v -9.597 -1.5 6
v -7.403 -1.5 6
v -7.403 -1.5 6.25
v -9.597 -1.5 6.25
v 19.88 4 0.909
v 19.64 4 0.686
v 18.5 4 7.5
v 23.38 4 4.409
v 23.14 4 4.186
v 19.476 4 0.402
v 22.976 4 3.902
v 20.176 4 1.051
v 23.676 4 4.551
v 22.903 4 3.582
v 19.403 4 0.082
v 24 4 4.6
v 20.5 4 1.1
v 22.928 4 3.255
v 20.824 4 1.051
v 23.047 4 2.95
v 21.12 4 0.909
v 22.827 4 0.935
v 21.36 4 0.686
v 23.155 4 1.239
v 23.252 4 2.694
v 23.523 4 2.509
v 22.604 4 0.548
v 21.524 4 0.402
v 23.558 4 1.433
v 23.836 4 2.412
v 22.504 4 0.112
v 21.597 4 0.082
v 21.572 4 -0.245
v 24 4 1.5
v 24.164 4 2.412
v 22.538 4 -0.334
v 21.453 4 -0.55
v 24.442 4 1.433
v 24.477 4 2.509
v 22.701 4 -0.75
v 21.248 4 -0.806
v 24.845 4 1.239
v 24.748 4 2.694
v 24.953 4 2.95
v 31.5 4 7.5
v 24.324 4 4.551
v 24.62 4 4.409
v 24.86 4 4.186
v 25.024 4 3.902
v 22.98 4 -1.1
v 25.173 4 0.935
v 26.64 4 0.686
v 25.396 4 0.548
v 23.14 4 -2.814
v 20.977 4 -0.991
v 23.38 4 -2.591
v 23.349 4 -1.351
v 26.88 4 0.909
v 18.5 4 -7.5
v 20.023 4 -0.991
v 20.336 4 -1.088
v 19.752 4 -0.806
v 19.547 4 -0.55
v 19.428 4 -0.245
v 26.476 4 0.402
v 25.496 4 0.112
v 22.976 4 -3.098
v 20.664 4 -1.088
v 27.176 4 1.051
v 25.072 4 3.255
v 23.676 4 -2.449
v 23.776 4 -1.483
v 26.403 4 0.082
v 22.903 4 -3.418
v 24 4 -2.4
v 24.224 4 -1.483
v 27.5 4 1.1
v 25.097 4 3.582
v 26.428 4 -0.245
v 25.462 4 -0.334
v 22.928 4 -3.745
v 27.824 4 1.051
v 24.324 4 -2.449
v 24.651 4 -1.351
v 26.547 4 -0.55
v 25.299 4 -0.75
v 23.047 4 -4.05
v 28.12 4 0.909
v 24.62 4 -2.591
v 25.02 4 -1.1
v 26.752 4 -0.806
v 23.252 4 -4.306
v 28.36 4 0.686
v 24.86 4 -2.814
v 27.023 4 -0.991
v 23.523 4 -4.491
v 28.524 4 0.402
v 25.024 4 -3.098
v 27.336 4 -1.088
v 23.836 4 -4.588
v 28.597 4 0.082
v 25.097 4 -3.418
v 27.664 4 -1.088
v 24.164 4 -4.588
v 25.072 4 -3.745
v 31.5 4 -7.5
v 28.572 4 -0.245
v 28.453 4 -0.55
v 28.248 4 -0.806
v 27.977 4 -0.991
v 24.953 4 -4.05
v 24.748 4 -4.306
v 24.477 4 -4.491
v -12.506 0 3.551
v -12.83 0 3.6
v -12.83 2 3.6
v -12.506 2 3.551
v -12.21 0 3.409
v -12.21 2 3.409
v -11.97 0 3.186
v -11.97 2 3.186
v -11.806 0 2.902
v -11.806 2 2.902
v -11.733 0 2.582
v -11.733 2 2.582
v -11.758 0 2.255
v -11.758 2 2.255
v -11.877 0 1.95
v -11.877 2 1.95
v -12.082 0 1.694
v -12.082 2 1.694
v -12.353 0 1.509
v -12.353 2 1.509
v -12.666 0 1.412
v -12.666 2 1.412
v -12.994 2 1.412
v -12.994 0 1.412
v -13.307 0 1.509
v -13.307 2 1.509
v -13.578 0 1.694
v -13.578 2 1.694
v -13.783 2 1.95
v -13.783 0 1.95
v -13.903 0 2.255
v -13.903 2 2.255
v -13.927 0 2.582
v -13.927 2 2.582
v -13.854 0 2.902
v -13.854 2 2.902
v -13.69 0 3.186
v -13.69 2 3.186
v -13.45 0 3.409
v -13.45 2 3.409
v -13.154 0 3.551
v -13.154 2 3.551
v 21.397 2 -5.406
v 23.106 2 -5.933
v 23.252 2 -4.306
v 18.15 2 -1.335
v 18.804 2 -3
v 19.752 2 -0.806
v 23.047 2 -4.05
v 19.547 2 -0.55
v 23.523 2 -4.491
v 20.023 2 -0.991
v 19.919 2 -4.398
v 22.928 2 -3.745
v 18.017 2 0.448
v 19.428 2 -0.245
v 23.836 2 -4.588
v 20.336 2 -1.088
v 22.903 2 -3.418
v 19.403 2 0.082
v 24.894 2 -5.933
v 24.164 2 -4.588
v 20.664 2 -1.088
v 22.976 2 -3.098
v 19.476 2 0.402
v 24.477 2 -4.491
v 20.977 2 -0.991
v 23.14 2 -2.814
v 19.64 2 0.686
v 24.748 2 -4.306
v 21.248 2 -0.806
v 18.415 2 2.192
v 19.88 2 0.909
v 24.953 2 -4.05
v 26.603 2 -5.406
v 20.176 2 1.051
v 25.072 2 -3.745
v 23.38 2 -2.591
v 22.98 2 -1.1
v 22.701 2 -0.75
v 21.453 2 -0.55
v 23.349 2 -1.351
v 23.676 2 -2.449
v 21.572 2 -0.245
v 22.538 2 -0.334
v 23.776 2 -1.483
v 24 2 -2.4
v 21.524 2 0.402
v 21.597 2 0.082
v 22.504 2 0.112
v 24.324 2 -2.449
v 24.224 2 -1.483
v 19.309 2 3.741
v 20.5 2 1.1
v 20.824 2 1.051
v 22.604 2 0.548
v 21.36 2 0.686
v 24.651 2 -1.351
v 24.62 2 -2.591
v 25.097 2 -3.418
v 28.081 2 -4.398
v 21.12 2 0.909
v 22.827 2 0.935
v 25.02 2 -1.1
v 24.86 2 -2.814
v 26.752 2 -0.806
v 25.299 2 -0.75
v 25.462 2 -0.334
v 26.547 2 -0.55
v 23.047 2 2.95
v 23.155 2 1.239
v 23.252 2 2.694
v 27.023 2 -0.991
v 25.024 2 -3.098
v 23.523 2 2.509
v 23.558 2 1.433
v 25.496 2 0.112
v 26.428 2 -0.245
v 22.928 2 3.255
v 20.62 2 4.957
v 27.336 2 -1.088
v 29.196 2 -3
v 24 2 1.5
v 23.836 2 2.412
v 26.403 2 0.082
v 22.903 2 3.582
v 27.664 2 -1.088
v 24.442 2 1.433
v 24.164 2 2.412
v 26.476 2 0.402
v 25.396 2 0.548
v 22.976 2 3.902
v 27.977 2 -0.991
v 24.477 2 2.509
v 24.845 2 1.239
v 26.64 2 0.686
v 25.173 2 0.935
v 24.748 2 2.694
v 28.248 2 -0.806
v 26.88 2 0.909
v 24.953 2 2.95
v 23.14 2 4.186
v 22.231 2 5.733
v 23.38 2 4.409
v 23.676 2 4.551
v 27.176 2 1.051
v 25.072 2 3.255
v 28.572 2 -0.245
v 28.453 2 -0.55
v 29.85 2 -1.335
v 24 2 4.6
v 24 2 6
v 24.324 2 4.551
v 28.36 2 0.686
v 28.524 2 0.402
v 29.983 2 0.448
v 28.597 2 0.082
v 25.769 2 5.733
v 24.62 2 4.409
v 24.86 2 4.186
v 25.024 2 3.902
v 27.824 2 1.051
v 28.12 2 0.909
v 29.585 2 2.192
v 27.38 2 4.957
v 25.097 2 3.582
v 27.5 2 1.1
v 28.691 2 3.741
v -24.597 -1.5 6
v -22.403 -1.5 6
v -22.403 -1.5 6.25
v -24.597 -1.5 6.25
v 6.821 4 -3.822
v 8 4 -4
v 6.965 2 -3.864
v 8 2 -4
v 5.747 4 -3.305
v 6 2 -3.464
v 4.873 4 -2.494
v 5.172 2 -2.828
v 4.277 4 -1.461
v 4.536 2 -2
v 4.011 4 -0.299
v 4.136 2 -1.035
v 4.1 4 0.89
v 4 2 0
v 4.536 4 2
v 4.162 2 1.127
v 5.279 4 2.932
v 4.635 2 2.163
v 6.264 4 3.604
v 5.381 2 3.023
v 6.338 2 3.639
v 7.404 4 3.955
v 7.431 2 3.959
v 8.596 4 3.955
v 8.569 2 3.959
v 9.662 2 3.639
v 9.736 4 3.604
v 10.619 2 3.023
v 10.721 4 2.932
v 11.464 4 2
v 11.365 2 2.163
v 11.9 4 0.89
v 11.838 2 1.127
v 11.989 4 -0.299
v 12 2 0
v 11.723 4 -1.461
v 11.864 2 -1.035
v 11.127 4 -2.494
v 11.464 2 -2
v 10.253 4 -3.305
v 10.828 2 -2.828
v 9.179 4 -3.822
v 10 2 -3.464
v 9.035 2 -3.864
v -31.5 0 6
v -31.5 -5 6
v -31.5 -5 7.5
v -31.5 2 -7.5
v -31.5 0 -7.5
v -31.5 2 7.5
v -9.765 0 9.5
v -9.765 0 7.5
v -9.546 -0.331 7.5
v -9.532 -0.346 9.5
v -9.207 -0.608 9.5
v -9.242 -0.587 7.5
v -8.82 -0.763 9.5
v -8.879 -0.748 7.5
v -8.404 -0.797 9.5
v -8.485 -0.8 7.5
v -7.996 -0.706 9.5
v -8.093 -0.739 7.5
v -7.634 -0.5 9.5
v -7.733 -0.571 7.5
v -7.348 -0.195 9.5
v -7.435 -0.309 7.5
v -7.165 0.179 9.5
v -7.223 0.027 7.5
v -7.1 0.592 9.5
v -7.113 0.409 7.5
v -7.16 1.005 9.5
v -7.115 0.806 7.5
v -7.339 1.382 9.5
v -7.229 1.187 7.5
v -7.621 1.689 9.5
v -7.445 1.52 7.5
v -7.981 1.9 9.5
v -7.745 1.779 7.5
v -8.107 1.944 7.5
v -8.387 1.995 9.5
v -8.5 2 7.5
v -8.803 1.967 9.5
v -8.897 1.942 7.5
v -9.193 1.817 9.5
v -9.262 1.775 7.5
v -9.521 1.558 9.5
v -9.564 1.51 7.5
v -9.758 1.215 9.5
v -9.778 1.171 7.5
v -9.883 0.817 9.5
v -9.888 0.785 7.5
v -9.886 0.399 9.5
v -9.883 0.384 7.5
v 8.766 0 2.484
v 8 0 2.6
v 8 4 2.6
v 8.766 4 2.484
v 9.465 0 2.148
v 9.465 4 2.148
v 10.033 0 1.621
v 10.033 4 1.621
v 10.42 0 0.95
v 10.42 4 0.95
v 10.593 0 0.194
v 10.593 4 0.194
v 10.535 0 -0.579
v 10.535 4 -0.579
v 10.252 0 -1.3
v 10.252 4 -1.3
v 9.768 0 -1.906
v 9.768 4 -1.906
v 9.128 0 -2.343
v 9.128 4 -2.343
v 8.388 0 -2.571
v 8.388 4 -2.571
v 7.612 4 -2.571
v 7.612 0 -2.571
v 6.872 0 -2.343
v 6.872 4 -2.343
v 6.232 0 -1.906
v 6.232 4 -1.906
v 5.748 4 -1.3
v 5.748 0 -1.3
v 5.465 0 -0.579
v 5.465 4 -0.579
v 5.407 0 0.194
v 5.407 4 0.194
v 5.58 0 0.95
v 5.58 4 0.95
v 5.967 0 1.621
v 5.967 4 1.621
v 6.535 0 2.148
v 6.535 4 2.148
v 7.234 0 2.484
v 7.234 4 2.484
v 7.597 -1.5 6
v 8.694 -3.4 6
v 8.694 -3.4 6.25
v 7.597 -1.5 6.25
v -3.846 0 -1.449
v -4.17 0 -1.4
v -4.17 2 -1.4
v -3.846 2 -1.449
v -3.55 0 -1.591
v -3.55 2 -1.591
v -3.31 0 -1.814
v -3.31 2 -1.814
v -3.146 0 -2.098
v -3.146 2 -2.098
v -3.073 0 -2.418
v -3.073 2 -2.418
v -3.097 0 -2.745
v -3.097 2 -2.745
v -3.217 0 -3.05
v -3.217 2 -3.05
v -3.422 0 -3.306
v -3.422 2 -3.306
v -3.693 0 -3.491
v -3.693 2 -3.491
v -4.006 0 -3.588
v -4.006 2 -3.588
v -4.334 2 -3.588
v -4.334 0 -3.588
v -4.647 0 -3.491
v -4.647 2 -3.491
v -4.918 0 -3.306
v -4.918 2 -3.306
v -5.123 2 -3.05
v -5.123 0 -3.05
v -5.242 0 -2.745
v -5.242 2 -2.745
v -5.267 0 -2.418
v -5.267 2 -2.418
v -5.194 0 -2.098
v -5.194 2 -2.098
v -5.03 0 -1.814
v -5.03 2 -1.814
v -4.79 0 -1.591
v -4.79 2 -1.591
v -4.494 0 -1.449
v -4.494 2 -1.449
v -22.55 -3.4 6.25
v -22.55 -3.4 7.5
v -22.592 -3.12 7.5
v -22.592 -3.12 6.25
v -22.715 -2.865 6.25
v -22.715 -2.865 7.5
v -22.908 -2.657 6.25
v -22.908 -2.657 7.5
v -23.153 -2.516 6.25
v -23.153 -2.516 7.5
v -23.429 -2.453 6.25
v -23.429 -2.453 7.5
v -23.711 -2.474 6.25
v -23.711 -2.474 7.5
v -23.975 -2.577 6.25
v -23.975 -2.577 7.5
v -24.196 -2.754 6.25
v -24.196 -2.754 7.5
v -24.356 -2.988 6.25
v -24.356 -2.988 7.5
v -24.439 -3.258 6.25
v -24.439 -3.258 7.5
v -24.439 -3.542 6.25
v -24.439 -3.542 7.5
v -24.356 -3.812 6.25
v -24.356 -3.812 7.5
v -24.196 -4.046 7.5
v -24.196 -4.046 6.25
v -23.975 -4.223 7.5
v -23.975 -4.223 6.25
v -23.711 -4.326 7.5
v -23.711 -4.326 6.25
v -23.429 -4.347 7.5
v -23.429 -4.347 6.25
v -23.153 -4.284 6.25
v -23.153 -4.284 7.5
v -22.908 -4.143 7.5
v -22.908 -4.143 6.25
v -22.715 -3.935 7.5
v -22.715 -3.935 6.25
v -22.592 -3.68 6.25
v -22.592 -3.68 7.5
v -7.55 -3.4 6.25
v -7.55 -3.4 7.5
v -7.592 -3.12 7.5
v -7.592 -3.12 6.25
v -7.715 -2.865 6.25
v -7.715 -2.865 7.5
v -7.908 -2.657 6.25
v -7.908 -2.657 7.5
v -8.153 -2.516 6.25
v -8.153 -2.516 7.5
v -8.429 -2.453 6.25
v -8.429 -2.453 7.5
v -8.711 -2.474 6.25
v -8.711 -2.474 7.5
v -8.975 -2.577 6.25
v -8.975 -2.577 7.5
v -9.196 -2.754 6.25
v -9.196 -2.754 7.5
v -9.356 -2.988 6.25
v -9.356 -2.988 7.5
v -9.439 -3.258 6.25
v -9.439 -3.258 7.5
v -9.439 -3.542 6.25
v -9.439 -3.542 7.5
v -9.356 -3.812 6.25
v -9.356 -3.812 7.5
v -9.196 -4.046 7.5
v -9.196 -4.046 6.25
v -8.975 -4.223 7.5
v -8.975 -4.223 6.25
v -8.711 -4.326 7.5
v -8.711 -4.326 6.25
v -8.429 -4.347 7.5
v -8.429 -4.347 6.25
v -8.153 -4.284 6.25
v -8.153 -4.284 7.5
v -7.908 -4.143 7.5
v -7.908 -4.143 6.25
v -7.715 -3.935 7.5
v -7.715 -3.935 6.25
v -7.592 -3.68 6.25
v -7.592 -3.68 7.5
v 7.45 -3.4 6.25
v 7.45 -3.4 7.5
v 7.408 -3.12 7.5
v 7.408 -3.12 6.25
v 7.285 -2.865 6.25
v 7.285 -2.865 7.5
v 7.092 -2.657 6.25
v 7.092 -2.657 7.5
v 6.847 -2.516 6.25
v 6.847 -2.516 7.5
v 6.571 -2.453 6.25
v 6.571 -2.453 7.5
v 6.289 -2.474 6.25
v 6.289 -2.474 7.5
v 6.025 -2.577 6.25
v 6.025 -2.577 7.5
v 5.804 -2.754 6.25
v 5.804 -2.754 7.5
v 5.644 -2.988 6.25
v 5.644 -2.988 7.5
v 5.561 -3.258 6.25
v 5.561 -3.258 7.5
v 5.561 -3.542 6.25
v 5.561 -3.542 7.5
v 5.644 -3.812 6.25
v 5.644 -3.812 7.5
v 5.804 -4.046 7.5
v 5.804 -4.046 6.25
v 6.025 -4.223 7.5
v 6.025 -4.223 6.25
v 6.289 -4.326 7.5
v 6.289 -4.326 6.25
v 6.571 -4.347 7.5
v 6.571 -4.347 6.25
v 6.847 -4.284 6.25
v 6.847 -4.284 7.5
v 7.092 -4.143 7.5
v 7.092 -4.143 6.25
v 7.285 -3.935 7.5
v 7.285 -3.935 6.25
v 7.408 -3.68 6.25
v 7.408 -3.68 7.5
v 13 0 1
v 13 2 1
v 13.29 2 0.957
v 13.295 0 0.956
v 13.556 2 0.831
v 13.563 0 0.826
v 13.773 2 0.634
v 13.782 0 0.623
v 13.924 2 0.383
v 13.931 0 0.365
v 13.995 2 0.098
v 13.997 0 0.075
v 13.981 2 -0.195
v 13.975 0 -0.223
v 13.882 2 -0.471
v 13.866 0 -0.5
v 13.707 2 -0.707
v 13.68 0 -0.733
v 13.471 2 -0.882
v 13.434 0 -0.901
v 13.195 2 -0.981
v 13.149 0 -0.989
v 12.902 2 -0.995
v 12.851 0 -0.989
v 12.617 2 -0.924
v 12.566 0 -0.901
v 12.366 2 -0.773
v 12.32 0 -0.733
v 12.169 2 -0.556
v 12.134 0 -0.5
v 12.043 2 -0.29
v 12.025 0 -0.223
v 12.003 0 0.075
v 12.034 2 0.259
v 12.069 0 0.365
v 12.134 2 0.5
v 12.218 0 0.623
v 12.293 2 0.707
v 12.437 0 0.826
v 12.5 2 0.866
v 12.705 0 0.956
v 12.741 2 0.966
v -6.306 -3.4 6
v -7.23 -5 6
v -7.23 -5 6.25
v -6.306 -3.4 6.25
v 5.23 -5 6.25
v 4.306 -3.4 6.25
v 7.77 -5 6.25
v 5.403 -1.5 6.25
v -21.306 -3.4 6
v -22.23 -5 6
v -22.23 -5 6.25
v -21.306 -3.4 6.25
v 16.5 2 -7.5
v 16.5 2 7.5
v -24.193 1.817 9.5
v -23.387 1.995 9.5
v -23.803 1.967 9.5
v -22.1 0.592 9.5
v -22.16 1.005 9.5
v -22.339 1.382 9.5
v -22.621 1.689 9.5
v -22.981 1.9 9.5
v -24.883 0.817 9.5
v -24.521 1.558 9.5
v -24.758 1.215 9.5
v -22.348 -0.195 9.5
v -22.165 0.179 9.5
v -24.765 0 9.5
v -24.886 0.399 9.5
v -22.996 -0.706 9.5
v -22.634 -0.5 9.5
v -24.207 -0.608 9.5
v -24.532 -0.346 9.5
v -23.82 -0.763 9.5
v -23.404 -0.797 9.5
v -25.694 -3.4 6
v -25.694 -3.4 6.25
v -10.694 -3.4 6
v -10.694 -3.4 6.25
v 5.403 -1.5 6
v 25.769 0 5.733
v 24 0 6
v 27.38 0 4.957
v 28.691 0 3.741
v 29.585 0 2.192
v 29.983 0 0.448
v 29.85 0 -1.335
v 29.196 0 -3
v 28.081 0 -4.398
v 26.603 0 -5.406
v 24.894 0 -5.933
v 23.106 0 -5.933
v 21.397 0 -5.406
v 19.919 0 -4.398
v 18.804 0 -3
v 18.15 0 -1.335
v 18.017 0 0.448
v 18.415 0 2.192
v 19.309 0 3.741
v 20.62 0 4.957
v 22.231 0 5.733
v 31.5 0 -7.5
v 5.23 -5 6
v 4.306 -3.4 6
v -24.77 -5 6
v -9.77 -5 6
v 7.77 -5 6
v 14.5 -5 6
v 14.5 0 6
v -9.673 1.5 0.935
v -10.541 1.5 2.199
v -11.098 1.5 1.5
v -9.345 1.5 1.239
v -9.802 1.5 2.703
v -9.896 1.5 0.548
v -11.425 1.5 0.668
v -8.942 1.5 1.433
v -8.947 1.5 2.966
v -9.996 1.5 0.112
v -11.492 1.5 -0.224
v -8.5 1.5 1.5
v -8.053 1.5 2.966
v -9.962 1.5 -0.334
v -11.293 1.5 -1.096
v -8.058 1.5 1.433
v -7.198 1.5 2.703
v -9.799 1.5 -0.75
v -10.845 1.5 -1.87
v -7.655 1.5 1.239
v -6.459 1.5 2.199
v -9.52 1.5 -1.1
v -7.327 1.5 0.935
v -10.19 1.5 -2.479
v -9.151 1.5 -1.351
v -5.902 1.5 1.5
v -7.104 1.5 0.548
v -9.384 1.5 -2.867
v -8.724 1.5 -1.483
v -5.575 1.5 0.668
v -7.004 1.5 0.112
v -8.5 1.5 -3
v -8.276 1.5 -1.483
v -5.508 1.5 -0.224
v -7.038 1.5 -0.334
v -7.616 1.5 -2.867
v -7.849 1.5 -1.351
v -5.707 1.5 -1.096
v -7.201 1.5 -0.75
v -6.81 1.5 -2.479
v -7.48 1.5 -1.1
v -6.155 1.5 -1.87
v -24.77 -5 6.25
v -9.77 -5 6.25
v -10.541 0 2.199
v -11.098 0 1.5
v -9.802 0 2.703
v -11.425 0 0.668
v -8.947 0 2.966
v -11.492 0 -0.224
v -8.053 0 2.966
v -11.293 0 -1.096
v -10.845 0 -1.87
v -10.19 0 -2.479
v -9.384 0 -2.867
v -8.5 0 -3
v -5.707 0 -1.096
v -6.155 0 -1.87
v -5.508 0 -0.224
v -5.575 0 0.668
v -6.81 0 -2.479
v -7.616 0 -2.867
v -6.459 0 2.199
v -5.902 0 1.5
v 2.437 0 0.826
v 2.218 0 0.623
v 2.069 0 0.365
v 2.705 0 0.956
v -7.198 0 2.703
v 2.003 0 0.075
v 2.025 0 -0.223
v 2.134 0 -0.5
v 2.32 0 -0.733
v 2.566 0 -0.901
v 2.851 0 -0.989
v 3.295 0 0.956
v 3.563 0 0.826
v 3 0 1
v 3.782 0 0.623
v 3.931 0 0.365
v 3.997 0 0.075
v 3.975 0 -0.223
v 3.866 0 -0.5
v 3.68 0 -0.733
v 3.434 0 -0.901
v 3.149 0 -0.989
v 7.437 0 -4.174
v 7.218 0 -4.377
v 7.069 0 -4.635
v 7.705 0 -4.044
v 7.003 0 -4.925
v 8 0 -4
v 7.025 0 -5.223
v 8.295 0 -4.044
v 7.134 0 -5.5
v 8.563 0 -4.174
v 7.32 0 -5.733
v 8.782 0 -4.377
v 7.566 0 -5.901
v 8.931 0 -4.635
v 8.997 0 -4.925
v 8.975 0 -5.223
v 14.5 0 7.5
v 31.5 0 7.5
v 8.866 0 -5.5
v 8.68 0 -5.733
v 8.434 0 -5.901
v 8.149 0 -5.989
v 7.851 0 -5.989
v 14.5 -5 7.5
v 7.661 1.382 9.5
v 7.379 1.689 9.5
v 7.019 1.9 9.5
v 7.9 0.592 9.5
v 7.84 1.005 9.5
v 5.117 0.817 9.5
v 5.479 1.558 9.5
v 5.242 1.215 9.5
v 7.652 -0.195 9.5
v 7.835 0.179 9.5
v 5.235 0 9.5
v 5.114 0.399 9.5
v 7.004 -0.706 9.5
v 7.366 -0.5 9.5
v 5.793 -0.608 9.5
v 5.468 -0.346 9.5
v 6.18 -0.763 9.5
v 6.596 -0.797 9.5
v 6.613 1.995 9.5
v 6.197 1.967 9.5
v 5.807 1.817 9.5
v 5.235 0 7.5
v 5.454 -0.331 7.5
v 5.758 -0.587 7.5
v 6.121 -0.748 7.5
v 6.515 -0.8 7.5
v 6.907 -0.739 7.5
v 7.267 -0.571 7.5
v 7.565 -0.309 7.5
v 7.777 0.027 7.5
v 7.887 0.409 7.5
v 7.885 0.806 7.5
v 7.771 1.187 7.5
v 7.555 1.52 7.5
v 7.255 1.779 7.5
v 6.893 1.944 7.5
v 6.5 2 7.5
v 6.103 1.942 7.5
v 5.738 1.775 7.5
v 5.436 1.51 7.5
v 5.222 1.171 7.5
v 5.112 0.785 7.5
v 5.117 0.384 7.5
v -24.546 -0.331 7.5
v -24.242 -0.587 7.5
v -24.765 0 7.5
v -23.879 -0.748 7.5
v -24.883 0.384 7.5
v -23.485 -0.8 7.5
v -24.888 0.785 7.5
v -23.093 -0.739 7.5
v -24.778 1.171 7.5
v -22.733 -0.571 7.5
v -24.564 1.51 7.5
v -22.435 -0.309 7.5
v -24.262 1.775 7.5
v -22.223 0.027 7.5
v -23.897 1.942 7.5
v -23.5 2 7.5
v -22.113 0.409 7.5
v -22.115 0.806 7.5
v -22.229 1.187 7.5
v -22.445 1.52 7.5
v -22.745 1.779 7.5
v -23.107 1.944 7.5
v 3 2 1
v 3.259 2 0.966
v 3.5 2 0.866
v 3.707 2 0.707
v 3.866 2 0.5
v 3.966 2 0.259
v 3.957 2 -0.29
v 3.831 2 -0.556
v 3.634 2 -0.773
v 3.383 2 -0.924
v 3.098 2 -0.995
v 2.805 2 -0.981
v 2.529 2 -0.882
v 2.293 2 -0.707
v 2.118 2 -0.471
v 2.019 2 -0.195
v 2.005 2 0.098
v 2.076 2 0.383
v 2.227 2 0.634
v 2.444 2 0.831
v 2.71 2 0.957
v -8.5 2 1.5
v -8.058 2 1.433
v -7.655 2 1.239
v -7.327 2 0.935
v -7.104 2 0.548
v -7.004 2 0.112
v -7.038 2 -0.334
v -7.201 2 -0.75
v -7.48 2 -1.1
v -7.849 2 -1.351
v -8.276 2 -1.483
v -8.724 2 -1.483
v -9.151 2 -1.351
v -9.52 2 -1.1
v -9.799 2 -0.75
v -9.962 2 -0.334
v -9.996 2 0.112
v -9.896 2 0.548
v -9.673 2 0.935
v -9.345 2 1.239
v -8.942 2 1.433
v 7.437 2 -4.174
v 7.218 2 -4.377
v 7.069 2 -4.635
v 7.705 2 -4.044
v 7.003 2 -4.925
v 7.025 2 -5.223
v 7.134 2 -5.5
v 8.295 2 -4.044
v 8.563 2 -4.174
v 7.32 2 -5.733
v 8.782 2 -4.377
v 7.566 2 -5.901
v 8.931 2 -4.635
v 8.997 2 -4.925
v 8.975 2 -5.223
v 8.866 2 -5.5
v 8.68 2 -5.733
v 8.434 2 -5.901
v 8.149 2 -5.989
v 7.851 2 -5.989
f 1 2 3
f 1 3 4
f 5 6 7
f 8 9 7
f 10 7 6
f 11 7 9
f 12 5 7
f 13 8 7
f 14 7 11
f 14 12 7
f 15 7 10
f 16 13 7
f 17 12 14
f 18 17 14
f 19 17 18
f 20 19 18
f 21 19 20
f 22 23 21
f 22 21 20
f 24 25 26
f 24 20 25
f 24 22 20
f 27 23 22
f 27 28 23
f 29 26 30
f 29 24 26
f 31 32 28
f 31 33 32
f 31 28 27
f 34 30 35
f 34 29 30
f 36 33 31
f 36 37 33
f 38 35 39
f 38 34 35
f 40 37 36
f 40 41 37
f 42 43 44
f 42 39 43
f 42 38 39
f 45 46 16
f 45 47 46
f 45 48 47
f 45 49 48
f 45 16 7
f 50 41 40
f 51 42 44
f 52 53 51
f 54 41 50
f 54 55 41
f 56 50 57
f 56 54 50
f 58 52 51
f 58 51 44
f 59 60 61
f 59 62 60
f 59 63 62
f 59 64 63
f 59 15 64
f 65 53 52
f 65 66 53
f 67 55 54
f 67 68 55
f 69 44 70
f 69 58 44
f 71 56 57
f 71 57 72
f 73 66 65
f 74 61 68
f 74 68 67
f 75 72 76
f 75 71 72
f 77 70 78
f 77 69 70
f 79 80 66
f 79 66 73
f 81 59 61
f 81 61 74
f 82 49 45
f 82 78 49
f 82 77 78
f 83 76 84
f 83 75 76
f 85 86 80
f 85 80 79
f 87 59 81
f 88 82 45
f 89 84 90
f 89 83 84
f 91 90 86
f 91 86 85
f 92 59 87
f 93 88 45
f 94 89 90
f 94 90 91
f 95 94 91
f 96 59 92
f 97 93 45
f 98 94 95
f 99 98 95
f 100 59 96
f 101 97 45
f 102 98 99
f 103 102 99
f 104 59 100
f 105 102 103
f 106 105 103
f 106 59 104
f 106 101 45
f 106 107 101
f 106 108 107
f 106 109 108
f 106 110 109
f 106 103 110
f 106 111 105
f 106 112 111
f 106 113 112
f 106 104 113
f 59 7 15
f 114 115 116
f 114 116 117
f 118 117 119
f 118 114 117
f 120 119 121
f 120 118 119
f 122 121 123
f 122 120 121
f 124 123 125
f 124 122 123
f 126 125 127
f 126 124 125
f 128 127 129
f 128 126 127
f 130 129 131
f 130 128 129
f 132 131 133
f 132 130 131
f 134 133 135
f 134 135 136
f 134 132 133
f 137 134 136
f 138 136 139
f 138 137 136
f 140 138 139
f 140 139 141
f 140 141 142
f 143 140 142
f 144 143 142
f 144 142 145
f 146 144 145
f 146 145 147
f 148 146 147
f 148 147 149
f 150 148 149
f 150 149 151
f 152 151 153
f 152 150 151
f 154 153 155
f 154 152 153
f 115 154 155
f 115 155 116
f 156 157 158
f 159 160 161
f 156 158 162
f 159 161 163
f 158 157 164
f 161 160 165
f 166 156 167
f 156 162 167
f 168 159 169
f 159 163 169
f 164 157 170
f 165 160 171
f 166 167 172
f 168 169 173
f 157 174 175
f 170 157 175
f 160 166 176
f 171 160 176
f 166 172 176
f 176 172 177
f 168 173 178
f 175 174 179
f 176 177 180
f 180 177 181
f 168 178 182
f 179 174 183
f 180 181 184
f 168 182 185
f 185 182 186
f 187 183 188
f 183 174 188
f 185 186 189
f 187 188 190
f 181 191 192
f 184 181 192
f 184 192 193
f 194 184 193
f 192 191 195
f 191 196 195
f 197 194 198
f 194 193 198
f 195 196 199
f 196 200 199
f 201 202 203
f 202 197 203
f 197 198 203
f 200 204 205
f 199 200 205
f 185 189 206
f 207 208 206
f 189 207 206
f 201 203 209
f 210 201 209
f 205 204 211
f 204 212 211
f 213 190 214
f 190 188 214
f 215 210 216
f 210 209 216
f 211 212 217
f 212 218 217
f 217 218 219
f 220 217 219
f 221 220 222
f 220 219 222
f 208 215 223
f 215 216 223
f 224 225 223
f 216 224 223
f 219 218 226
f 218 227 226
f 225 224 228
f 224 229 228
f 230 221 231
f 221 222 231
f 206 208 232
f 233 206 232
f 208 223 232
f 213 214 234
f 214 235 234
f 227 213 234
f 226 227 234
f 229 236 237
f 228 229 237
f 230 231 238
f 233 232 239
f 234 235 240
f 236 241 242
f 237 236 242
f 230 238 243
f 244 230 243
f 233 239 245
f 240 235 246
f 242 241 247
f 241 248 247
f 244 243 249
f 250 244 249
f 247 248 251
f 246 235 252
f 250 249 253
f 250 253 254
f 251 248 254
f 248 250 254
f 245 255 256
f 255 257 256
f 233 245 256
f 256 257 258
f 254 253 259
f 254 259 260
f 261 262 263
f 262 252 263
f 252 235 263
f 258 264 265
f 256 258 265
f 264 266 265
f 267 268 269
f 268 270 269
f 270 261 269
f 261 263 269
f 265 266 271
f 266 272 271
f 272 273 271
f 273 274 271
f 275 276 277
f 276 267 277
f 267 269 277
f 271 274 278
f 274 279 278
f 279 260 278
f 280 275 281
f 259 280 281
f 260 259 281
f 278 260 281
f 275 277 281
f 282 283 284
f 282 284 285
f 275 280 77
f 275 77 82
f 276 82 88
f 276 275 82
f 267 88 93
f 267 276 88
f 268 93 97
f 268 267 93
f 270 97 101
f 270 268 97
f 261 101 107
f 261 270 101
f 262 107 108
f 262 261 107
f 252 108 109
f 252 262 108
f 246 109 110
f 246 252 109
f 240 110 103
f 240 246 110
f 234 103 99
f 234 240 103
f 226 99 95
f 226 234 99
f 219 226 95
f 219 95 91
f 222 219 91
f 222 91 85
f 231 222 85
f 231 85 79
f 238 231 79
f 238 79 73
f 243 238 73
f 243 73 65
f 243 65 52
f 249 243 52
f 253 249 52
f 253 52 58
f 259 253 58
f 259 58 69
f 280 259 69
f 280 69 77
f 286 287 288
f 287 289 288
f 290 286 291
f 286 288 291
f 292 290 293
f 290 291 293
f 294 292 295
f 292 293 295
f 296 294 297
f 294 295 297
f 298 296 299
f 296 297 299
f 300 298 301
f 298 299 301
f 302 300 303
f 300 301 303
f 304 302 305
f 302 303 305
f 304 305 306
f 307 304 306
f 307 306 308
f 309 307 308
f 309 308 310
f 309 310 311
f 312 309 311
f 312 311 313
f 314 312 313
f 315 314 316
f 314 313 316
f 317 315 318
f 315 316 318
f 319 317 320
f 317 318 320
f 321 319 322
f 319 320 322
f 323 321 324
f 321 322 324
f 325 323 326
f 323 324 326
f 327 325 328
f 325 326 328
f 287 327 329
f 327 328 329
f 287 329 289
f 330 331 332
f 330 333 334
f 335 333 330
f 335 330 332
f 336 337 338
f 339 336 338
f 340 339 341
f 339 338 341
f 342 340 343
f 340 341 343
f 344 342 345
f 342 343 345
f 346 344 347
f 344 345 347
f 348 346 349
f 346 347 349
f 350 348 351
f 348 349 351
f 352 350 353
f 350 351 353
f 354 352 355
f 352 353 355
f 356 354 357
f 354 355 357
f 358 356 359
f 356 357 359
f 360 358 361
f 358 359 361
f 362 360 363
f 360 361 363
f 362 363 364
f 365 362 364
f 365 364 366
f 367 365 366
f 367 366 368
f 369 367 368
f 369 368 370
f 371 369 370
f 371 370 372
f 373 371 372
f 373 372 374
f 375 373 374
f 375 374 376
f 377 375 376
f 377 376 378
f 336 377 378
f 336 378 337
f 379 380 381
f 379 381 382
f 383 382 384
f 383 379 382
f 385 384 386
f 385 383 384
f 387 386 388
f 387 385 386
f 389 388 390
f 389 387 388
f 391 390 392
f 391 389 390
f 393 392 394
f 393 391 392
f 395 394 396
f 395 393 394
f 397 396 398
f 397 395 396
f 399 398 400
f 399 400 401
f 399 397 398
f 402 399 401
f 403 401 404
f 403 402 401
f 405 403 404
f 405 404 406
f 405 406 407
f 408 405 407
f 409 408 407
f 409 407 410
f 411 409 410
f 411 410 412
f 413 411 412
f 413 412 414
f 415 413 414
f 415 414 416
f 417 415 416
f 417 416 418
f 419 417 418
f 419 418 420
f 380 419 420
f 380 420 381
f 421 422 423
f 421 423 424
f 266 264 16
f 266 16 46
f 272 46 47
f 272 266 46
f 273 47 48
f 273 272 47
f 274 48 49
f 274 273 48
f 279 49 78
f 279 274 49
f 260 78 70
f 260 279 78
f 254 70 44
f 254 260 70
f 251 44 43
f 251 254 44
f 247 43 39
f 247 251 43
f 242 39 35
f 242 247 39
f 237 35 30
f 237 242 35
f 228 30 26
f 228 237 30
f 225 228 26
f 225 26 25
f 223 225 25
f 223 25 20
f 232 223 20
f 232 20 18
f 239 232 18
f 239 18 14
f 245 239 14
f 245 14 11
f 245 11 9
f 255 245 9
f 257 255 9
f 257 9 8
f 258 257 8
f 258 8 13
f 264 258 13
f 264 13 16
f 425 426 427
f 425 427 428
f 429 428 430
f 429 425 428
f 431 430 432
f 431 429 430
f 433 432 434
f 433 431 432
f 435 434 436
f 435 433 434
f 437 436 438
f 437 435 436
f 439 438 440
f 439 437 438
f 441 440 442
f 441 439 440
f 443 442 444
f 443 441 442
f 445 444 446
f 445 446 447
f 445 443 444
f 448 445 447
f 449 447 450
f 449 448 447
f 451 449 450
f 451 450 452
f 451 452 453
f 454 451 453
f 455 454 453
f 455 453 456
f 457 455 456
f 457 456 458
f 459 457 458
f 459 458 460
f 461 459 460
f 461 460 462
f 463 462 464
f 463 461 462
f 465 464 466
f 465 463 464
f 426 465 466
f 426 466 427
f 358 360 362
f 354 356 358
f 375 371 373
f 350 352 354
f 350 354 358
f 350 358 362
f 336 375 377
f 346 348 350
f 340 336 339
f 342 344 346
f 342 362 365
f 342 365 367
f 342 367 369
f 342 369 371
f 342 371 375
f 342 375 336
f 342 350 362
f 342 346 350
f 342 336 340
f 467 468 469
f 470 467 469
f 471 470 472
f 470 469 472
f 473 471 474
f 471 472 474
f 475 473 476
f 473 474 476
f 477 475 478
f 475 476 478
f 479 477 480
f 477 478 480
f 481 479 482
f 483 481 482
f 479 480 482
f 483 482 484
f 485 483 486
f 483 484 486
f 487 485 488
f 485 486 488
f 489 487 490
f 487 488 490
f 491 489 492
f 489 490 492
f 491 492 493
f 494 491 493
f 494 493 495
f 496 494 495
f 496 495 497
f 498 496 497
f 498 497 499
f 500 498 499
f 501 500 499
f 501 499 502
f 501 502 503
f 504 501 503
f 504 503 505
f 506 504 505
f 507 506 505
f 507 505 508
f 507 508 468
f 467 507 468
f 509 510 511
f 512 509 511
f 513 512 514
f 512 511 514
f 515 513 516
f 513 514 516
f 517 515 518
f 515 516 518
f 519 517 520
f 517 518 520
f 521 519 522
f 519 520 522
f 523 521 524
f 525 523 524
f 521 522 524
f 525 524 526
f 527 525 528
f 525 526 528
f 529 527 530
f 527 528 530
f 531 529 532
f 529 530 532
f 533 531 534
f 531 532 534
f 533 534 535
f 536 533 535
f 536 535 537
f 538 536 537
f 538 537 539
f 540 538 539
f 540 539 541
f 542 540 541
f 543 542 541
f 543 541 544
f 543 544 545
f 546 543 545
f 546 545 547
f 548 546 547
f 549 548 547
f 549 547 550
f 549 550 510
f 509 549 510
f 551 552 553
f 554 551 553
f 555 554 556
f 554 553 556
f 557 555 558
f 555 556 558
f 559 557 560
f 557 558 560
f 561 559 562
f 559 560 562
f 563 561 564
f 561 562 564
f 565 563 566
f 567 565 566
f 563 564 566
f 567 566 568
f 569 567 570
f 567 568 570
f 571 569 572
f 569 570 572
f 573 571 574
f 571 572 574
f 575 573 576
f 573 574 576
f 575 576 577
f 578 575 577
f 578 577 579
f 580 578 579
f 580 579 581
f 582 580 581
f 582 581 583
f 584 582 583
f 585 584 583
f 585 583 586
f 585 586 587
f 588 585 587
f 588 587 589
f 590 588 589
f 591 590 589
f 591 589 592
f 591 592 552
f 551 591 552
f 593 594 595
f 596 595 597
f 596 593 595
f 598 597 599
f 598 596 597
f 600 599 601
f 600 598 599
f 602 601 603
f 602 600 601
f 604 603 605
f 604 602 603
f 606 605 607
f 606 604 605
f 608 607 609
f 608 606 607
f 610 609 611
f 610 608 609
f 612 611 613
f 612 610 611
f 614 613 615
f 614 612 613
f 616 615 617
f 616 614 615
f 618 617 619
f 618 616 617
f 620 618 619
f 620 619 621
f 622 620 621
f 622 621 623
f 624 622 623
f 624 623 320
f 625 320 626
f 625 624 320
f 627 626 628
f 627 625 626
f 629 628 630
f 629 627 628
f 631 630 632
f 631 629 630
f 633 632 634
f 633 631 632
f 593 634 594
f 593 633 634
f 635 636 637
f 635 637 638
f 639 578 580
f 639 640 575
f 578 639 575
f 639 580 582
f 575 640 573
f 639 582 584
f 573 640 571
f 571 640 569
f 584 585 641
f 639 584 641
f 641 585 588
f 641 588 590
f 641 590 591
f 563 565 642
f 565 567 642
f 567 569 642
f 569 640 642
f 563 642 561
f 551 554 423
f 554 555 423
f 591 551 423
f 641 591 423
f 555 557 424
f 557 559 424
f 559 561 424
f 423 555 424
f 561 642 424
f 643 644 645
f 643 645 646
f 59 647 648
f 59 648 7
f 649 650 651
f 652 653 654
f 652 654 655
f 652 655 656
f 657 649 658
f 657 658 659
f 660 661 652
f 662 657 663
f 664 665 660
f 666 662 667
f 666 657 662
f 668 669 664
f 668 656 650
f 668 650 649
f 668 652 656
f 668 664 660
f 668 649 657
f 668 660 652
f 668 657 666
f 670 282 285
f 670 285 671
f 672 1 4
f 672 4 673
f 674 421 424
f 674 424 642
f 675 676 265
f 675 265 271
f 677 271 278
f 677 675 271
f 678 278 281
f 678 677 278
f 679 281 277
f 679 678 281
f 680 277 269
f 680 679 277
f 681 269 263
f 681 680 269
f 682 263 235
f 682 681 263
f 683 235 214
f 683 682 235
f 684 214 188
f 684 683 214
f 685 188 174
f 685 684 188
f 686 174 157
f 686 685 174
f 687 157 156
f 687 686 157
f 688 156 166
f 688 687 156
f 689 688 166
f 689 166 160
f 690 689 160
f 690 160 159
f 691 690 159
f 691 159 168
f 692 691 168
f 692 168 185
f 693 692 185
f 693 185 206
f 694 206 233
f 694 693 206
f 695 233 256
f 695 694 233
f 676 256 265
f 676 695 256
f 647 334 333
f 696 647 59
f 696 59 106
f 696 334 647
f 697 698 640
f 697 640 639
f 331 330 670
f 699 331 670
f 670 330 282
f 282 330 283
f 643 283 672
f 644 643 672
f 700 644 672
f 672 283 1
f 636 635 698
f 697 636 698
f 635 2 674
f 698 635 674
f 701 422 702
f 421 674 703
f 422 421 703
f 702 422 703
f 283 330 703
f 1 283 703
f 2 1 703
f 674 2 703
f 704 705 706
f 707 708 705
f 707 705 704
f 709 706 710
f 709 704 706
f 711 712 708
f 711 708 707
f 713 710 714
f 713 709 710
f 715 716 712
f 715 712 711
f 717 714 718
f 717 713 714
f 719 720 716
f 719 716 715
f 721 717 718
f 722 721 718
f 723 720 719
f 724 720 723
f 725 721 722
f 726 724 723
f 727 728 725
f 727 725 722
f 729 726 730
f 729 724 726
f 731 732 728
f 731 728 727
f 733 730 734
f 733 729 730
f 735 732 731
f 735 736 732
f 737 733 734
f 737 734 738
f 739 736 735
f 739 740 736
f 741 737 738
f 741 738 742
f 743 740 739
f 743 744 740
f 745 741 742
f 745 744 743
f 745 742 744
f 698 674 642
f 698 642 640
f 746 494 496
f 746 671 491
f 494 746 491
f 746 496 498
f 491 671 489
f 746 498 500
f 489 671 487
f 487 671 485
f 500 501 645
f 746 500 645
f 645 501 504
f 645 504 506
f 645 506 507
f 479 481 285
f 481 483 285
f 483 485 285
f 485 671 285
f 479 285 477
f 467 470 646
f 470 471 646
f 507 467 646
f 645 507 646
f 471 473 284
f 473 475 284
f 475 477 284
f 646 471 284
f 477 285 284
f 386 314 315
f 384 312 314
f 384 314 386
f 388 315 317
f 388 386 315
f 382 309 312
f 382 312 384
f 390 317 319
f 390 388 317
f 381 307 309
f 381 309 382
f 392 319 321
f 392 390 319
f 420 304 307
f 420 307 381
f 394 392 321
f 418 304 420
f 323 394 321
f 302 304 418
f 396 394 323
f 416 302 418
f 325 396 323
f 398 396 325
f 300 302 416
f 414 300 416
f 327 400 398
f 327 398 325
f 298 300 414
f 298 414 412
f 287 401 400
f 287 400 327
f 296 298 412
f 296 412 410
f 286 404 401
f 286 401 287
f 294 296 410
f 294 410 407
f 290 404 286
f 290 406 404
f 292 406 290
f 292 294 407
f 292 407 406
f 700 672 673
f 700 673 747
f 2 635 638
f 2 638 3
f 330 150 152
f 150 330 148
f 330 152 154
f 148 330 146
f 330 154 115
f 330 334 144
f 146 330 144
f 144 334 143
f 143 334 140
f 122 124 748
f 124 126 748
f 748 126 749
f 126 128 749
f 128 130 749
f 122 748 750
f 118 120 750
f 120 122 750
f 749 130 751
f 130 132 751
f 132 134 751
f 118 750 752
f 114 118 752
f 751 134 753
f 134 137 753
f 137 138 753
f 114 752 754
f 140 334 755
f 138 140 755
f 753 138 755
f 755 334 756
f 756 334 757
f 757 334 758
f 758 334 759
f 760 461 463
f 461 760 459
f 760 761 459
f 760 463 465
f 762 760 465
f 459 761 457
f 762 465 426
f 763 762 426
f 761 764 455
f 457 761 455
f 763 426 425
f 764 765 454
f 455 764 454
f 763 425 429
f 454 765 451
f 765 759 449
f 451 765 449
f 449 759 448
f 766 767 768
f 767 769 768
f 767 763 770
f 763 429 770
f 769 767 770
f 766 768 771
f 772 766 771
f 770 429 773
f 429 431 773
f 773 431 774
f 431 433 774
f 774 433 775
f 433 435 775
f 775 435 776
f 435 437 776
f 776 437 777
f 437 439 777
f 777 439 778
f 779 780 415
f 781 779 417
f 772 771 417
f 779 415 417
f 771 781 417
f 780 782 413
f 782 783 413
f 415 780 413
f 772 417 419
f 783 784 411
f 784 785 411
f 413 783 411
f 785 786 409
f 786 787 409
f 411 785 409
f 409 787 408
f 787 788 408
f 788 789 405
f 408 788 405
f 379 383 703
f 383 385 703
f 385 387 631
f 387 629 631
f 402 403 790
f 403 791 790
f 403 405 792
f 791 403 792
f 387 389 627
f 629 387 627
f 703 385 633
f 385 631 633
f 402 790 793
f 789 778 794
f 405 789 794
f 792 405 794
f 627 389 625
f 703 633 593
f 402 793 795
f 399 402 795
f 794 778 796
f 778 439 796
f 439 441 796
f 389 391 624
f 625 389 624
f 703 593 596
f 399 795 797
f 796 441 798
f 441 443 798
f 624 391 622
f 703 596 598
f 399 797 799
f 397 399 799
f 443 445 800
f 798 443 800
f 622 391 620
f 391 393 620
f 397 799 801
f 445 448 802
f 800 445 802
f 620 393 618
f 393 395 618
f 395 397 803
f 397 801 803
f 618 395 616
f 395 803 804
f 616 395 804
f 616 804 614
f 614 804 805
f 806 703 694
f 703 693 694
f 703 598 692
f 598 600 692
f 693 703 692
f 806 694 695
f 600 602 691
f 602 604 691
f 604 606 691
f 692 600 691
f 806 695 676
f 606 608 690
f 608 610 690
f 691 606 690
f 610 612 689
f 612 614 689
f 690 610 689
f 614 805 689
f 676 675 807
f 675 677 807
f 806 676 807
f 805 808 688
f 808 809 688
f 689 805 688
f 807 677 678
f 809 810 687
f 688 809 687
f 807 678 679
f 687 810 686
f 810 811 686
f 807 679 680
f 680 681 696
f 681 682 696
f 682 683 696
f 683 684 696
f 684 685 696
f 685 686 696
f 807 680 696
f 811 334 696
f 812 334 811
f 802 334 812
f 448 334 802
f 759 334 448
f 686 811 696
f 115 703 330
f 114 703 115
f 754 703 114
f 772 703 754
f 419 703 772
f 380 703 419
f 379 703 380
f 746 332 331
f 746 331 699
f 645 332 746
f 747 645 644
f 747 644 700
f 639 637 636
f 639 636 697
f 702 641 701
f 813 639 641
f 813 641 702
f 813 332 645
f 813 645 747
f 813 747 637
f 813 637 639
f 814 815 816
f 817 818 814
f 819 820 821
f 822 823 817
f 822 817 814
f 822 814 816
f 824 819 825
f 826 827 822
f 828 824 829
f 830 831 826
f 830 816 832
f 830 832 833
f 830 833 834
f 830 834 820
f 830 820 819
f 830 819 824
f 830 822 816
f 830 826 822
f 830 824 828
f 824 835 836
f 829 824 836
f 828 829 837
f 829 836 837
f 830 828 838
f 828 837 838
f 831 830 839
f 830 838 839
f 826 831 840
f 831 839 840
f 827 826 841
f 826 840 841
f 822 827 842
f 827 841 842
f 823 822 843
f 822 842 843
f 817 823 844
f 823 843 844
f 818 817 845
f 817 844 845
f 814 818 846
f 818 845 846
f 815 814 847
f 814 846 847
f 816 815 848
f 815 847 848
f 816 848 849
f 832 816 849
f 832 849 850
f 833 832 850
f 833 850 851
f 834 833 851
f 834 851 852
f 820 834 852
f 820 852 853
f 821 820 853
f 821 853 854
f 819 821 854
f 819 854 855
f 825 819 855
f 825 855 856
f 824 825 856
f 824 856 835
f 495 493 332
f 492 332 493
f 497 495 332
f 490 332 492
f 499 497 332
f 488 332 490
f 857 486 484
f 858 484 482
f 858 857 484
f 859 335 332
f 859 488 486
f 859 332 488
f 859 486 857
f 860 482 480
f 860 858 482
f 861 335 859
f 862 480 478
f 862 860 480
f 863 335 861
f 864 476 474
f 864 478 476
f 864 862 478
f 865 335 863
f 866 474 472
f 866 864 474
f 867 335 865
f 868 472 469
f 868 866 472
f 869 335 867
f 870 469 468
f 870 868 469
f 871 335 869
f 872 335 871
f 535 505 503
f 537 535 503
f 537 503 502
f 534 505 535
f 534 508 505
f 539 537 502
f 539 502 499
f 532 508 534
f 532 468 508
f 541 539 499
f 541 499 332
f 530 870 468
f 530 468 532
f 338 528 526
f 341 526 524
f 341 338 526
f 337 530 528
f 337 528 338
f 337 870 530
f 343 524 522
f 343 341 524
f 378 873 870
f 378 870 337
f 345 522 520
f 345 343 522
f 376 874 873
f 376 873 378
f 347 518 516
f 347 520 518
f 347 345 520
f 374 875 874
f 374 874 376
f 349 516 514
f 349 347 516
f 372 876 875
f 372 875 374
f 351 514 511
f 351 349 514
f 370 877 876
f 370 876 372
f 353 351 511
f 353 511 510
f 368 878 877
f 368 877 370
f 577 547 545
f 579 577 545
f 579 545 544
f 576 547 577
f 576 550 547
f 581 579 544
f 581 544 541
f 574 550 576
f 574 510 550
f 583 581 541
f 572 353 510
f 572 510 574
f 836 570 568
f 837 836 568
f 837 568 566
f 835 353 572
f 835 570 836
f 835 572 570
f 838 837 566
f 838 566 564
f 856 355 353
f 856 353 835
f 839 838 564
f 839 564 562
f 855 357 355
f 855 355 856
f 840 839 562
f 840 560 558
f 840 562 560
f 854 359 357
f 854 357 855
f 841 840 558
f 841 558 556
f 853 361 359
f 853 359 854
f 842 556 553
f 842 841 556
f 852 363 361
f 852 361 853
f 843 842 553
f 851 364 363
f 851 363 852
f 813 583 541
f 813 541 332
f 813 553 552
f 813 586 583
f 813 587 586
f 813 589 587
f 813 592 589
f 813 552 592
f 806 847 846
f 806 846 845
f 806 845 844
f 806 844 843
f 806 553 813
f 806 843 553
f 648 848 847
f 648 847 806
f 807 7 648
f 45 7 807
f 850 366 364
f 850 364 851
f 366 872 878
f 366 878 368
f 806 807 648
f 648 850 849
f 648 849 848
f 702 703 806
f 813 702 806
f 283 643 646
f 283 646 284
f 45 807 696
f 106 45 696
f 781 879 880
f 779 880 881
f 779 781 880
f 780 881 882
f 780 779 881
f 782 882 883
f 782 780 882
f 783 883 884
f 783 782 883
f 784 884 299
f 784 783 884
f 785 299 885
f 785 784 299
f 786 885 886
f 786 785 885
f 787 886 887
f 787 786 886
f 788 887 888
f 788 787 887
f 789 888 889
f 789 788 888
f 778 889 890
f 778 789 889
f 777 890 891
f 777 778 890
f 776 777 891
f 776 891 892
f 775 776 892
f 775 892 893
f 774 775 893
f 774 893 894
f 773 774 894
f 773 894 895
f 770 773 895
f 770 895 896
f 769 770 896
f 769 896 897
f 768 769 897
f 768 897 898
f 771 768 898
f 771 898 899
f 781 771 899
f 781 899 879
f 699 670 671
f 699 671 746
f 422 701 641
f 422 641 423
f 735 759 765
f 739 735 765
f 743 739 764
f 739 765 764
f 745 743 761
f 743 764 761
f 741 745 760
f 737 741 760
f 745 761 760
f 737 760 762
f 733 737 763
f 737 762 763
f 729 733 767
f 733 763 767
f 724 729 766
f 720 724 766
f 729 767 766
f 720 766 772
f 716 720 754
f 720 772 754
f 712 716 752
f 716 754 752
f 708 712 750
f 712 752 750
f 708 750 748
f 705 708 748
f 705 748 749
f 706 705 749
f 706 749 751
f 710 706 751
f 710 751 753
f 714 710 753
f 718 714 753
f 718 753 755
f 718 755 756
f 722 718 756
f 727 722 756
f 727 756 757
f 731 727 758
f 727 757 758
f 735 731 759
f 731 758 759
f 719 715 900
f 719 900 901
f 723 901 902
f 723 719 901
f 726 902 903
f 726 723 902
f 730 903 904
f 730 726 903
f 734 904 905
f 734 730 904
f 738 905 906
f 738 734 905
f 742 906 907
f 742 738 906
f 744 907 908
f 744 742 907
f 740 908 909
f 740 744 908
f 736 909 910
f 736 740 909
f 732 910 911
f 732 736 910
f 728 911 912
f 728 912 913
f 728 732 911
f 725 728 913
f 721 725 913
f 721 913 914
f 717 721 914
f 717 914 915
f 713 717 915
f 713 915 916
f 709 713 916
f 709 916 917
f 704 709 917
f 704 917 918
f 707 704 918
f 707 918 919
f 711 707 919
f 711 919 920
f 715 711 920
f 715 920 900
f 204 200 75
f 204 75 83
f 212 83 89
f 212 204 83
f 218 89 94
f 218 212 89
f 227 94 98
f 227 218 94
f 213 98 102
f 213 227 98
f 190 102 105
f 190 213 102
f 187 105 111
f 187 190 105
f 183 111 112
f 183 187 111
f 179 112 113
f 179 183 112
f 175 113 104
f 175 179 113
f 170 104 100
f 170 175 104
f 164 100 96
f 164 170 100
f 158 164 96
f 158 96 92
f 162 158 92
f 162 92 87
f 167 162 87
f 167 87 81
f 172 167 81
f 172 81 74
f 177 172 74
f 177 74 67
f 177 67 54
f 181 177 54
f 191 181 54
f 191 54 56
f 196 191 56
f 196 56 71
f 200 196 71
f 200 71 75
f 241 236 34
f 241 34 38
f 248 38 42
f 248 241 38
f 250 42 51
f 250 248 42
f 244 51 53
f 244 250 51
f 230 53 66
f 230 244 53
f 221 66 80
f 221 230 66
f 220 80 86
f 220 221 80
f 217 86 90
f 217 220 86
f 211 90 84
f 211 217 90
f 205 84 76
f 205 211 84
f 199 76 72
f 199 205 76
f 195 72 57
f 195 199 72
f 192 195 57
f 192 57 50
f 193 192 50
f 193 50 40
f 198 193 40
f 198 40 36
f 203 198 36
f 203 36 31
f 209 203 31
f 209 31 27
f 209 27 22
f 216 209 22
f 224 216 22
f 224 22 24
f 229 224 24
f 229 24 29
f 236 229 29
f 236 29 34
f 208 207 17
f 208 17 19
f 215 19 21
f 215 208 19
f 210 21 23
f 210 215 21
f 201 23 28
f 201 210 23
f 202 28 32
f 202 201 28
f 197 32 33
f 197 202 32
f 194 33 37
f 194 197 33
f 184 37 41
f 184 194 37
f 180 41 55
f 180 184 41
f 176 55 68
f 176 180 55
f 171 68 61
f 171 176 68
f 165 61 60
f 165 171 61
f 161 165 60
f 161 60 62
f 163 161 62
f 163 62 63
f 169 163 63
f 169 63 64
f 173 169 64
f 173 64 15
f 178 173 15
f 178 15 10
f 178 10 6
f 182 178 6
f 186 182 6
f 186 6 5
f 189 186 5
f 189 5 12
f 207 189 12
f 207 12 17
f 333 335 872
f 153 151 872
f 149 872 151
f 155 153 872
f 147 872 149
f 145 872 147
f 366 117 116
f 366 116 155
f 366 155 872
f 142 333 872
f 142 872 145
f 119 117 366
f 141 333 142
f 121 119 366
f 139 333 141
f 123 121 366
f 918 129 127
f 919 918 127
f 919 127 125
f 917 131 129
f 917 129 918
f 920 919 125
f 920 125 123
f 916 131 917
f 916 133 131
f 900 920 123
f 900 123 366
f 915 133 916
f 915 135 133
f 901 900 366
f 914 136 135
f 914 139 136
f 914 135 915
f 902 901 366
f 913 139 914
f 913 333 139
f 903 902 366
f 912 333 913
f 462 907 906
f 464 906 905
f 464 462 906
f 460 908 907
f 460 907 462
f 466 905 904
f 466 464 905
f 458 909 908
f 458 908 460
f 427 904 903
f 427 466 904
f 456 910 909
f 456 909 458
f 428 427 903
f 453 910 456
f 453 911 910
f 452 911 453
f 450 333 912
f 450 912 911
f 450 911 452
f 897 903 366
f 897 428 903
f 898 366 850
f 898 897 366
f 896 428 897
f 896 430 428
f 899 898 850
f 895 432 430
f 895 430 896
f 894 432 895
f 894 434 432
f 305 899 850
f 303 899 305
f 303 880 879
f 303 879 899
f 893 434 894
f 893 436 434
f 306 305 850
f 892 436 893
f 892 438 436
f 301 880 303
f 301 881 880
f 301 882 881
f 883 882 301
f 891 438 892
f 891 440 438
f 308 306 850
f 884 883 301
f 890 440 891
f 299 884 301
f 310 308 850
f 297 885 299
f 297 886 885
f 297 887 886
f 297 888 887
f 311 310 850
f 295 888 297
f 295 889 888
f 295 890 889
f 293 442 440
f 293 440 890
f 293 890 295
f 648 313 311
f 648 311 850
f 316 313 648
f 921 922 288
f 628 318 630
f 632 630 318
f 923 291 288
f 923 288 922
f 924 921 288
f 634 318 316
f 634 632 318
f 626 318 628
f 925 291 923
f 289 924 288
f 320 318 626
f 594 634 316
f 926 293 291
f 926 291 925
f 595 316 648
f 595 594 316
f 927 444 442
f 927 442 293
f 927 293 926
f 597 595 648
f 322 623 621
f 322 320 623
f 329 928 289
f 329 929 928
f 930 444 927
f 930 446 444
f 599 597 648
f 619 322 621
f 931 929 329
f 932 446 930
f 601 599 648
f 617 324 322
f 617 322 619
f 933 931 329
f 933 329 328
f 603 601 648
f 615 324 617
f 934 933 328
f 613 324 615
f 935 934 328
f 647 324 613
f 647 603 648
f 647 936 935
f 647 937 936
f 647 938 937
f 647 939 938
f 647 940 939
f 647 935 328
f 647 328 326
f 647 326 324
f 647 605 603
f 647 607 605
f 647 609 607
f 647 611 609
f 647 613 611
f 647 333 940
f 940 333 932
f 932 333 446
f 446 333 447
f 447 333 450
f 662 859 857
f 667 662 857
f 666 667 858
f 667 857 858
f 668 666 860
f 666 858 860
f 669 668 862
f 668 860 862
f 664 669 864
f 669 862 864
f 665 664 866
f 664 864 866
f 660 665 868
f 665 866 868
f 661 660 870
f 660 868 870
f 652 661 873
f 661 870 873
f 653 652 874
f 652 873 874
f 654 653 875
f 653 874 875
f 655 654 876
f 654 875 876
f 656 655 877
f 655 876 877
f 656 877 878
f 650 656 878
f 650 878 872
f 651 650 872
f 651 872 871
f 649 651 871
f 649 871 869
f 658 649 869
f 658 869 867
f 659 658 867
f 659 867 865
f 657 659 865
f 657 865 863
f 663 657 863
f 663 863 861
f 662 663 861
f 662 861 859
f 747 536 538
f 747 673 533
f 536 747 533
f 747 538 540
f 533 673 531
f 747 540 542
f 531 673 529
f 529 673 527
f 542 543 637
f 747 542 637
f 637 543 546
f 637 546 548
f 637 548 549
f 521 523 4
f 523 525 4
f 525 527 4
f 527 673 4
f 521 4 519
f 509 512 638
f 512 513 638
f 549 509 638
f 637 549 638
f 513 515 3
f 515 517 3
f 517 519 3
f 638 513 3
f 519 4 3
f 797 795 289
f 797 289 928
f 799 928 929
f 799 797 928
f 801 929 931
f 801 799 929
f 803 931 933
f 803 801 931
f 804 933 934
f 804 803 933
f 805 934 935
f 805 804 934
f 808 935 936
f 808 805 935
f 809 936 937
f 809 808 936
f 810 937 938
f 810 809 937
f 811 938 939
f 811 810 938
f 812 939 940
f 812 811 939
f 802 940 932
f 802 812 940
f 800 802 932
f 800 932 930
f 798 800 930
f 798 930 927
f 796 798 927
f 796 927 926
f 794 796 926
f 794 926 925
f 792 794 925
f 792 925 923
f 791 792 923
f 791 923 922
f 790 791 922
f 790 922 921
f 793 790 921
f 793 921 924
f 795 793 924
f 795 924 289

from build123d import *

# Parameters (mm, degrees)
SKETCH_1_W          = 63
SKETCH_1_H          = 15
SKETCH_1_R          = 1.1
SKETCH_1_R_2        = 1
SKETCH_1_R_3        = 1.5
SKETCH_1_R_4        = 2.6
EXTRUDE_1_DEPTH     = 2
SKETCH_2_R          = 1.4
EXTRUDE_2_DEPTH     = 2
SKETCH_3_R          = 3
CUT_EXTRUDE_1_DEPTH = 1.5
SKETCH_4_W          = 46
SKETCH_4_H          = 1.5
EXTRUDE_3_DEPTH     = 5
SKETCH_2_3_R        = 0.95
CUT_EXTRUDE_2_DEPTH = 1.5
CUT_EXTRUDE_3_DEPTH = 0.25
SKETCH_1_7_W        = 15
SKETCH_1_7_H        = 15
SKETCH_1_7_R        = 1.5
SKETCH_1_7_R_2      = 1.1
EXTRUDE_4_DEPTH     = 4
SKETCH_1_8_R        = 6
SKETCH_1_8_R_2      = 1.5
SKETCH_1_8_R_3      = 1.1
CUT_EXTRUDE_4_DEPTH = 2
CUT_EXTRUDE_5_DEPTH = 15
SKETCH_1_9_R        = 4
SKETCH_1_9_R_2      = 2.6
EXTRUDE_5_DEPTH     = 4


with BuildPart() as part:
    # 草图1 → 凸台-拉伸1 (new body)
    with BuildSketch(Plane(origin=(0, 0, 0), x_dir=(1, 0, 0), z_dir=(0, 1, 0))):
        Rectangle(SKETCH_1_W, SKETCH_1_H)
        with Locations(Location((-12.830127019, -2.5, 0), (0, 0, 270))):
            Circle(SKETCH_1_R, mode=Mode.SUBTRACT)
        with Locations(Location((3, 0, 0), (0, 0, 270))):
            Circle(SKETCH_1_R_2, mode=Mode.SUBTRACT)
        with Locations(Location((13, 0, 0), (0, 0, 270))):
            Circle(SKETCH_1_R_2, mode=Mode.SUBTRACT)
        with Locations(Location((-8.5, 0, 0), (0, 0, 270))):
            Circle(SKETCH_1_R_3, mode=Mode.SUBTRACT)
        with Locations(Location((-4.169872981, 2.5, 0), (0, 0, 270))):
            Circle(SKETCH_1_R, mode=Mode.SUBTRACT)
        with Locations(Location((8, 5, 0), (0, 0, 270))):
            Circle(SKETCH_1_R_2, mode=Mode.SUBTRACT)
        with Locations(Location((8, 0, 0), (0, 0, 270))):
            Circle(SKETCH_1_R_4, mode=Mode.SUBTRACT)
        with Locations(Location((24, 3.5, 0), (0, 0, 270))):
            Circle(SKETCH_1_R, mode=Mode.SUBTRACT)
        with Locations(Location((24, -3.5, 0), (0, 0, 270))):
            Circle(SKETCH_1_R, mode=Mode.SUBTRACT)
        with Locations(Location((20.5, 0, 0), (0, 0, 270))):
            Circle(SKETCH_1_R, mode=Mode.SUBTRACT)
        with Locations(Location((24, 0, 0), (0, 0, 270))):
            Circle(SKETCH_1_R_3, mode=Mode.SUBTRACT)
        with Locations(Location((27.5, 0, 0), (0, 0, 270))):
            Circle(SKETCH_1_R, mode=Mode.SUBTRACT)
    extrude(amount=EXTRUDE_1_DEPTH)

    # 草图2 → 凸台-拉伸2 (add)
    with BuildSketch(Plane.XY.offset(7.5)):
        with Locations(Location((-23.5, 0.6, 0), (0, 0, 205.376933525))):
            Circle(SKETCH_2_R)
        with Locations(Location((-8.5, 0.6, 0), (0, 0, 205.376933525))):
            Circle(SKETCH_2_R)
        with Locations(Location((6.5, 0.6, 0), (0, 0, 205.376933525))):
            Circle(SKETCH_2_R)
    extrude(amount=EXTRUDE_2_DEPTH)

    # 草图3 → 切除-拉伸1 (cut)
    with BuildSketch(Plane.XZ):
        with Locations(Location((-8.5, 0, 0), (0, 0, 270))):
            Circle(SKETCH_3_R)
    extrude(amount=-CUT_EXTRUDE_1_DEPTH, mode=Mode.SUBTRACT)

    # 草图4 → 凸台-拉伸3 (add)
    with BuildSketch(Plane.XZ):
        with Locations((-8.5, 6.75)):
            Rectangle(SKETCH_4_W, SKETCH_4_H)
    extrude(amount=EXTRUDE_3_DEPTH)

    # 草图2<3> → 切除-拉伸2 (cut)
    with BuildSketch(Plane.XY.offset(7.5)):
        with Locations((-23.5, -3.4)):
            Circle(SKETCH_2_3_R)
        with Locations((-8.5, -3.4)):
            Circle(SKETCH_2_3_R)
        with Locations((6.5, -3.4)):
            Circle(SKETCH_2_3_R)
    extrude(amount=-CUT_EXTRUDE_2_DEPTH, mode=Mode.SUBTRACT)

    # 草图5 → 切除-拉伸3 (cut)
    with BuildSketch(Plane(origin=(0, 0, 6), x_dir=(-1, 0, 0), z_dir=(0, 0, -1))):
        Polygon((22.403034489, -1.5), (24.596965511, -1.5), (25.693931023, -3.4), (24.596965511, -5.3), (22.403034489, -5.3), (21.306068977, -3.4), align=None)
        Polygon((6.306068977, -3.4), (7.403034489, -1.5), (9.596965511, -1.5), (10.693931023, -3.4), (9.596965511, -5.3), (7.403034489, -5.3), align=None)
        Polygon((-8.693931023, -3.4), (-7.596965511, -1.5), (-5.403034489, -1.5), (-4.306068977, -3.4), (-5.403034489, -5.3), (-7.596965511, -5.3), align=None)
    extrude(amount=-CUT_EXTRUDE_3_DEPTH, mode=Mode.SUBTRACT)

    # 草图1<7> → 凸台-拉伸4 (add)
    with BuildSketch(Plane(origin=(0, 0, 0), x_dir=(1, 0, 0), z_dir=(0, 1, 0))):
        with Locations((24, 0)):
            Rectangle(SKETCH_1_7_W, SKETCH_1_7_H)
        with Locations(Location((24, 0, 0), (0, 0, 270))):
            Circle(SKETCH_1_7_R, mode=Mode.SUBTRACT)
        with Locations(Location((27.5, 0, 0), (0, 0, 270))):
            Circle(SKETCH_1_7_R_2, mode=Mode.SUBTRACT)
        with Locations(Location((24, -3.5, 0), (0, 0, 270))):
            Circle(SKETCH_1_7_R_2, mode=Mode.SUBTRACT)
        with Locations(Location((20.5, 0, 0), (0, 0, 270))):
            Circle(SKETCH_1_7_R_2, mode=Mode.SUBTRACT)
        with Locations(Location((24, 3.5, 0), (0, 0, 270))):
            Circle(SKETCH_1_7_R_2, mode=Mode.SUBTRACT)
    extrude(amount=EXTRUDE_4_DEPTH)

    # 草图1<8> → 切除-拉伸4 (cut)
    with BuildSketch(Plane(origin=(0, 0, 0), x_dir=(1, 0, 0), z_dir=(0, 1, 0))):
        with Locations(Location((24, 0, 0), (0, 0, 270))):
            Circle(SKETCH_1_8_R)
        with Locations(Location((24, 0, 0), (0, 0, 270))):
            Circle(SKETCH_1_8_R_2, mode=Mode.SUBTRACT)
        with Locations(Location((27.5, 0, 0), (0, 0, 270))):
            Circle(SKETCH_1_8_R_3, mode=Mode.SUBTRACT)
        with Locations(Location((24, -3.5, 0), (0, 0, 270))):
            Circle(SKETCH_1_8_R_3, mode=Mode.SUBTRACT)
        with Locations(Location((20.5, 0, 0), (0, 0, 270))):
            Circle(SKETCH_1_8_R_3, mode=Mode.SUBTRACT)
        with Locations(Location((24, 3.5, 0), (0, 0, 270))):
            Circle(SKETCH_1_8_R_3, mode=Mode.SUBTRACT)
    extrude(amount=CUT_EXTRUDE_4_DEPTH, mode=Mode.SUBTRACT)

    # 草图6 → 切除-拉伸5 (cut)
    with BuildSketch(Plane(origin=(0, 0, -7.5), x_dir=(-1, 0, 0), z_dir=(0, 0, -1))):
        Polygon((-16.5, 2), (-18.5, 4), (-16.5, 4), align=None)
    extrude(amount=-CUT_EXTRUDE_5_DEPTH, mode=Mode.SUBTRACT)

    # 草图1<9> → 凸台-拉伸5 (add)
    with BuildSketch(Plane(origin=(0, 0, 0), x_dir=(1, 0, 0), z_dir=(0, 1, 0))):
        with Locations(Location((8, 0, 0), (0, 0, 89.999818815))):
            Circle(SKETCH_1_9_R)
        with Locations(Location((8, 0, 0), (0, 0, 270))):
            Circle(SKETCH_1_9_R_2, mode=Mode.SUBTRACT)
    extrude(amount=EXTRUDE_5_DEPTH)


solid = part.part
